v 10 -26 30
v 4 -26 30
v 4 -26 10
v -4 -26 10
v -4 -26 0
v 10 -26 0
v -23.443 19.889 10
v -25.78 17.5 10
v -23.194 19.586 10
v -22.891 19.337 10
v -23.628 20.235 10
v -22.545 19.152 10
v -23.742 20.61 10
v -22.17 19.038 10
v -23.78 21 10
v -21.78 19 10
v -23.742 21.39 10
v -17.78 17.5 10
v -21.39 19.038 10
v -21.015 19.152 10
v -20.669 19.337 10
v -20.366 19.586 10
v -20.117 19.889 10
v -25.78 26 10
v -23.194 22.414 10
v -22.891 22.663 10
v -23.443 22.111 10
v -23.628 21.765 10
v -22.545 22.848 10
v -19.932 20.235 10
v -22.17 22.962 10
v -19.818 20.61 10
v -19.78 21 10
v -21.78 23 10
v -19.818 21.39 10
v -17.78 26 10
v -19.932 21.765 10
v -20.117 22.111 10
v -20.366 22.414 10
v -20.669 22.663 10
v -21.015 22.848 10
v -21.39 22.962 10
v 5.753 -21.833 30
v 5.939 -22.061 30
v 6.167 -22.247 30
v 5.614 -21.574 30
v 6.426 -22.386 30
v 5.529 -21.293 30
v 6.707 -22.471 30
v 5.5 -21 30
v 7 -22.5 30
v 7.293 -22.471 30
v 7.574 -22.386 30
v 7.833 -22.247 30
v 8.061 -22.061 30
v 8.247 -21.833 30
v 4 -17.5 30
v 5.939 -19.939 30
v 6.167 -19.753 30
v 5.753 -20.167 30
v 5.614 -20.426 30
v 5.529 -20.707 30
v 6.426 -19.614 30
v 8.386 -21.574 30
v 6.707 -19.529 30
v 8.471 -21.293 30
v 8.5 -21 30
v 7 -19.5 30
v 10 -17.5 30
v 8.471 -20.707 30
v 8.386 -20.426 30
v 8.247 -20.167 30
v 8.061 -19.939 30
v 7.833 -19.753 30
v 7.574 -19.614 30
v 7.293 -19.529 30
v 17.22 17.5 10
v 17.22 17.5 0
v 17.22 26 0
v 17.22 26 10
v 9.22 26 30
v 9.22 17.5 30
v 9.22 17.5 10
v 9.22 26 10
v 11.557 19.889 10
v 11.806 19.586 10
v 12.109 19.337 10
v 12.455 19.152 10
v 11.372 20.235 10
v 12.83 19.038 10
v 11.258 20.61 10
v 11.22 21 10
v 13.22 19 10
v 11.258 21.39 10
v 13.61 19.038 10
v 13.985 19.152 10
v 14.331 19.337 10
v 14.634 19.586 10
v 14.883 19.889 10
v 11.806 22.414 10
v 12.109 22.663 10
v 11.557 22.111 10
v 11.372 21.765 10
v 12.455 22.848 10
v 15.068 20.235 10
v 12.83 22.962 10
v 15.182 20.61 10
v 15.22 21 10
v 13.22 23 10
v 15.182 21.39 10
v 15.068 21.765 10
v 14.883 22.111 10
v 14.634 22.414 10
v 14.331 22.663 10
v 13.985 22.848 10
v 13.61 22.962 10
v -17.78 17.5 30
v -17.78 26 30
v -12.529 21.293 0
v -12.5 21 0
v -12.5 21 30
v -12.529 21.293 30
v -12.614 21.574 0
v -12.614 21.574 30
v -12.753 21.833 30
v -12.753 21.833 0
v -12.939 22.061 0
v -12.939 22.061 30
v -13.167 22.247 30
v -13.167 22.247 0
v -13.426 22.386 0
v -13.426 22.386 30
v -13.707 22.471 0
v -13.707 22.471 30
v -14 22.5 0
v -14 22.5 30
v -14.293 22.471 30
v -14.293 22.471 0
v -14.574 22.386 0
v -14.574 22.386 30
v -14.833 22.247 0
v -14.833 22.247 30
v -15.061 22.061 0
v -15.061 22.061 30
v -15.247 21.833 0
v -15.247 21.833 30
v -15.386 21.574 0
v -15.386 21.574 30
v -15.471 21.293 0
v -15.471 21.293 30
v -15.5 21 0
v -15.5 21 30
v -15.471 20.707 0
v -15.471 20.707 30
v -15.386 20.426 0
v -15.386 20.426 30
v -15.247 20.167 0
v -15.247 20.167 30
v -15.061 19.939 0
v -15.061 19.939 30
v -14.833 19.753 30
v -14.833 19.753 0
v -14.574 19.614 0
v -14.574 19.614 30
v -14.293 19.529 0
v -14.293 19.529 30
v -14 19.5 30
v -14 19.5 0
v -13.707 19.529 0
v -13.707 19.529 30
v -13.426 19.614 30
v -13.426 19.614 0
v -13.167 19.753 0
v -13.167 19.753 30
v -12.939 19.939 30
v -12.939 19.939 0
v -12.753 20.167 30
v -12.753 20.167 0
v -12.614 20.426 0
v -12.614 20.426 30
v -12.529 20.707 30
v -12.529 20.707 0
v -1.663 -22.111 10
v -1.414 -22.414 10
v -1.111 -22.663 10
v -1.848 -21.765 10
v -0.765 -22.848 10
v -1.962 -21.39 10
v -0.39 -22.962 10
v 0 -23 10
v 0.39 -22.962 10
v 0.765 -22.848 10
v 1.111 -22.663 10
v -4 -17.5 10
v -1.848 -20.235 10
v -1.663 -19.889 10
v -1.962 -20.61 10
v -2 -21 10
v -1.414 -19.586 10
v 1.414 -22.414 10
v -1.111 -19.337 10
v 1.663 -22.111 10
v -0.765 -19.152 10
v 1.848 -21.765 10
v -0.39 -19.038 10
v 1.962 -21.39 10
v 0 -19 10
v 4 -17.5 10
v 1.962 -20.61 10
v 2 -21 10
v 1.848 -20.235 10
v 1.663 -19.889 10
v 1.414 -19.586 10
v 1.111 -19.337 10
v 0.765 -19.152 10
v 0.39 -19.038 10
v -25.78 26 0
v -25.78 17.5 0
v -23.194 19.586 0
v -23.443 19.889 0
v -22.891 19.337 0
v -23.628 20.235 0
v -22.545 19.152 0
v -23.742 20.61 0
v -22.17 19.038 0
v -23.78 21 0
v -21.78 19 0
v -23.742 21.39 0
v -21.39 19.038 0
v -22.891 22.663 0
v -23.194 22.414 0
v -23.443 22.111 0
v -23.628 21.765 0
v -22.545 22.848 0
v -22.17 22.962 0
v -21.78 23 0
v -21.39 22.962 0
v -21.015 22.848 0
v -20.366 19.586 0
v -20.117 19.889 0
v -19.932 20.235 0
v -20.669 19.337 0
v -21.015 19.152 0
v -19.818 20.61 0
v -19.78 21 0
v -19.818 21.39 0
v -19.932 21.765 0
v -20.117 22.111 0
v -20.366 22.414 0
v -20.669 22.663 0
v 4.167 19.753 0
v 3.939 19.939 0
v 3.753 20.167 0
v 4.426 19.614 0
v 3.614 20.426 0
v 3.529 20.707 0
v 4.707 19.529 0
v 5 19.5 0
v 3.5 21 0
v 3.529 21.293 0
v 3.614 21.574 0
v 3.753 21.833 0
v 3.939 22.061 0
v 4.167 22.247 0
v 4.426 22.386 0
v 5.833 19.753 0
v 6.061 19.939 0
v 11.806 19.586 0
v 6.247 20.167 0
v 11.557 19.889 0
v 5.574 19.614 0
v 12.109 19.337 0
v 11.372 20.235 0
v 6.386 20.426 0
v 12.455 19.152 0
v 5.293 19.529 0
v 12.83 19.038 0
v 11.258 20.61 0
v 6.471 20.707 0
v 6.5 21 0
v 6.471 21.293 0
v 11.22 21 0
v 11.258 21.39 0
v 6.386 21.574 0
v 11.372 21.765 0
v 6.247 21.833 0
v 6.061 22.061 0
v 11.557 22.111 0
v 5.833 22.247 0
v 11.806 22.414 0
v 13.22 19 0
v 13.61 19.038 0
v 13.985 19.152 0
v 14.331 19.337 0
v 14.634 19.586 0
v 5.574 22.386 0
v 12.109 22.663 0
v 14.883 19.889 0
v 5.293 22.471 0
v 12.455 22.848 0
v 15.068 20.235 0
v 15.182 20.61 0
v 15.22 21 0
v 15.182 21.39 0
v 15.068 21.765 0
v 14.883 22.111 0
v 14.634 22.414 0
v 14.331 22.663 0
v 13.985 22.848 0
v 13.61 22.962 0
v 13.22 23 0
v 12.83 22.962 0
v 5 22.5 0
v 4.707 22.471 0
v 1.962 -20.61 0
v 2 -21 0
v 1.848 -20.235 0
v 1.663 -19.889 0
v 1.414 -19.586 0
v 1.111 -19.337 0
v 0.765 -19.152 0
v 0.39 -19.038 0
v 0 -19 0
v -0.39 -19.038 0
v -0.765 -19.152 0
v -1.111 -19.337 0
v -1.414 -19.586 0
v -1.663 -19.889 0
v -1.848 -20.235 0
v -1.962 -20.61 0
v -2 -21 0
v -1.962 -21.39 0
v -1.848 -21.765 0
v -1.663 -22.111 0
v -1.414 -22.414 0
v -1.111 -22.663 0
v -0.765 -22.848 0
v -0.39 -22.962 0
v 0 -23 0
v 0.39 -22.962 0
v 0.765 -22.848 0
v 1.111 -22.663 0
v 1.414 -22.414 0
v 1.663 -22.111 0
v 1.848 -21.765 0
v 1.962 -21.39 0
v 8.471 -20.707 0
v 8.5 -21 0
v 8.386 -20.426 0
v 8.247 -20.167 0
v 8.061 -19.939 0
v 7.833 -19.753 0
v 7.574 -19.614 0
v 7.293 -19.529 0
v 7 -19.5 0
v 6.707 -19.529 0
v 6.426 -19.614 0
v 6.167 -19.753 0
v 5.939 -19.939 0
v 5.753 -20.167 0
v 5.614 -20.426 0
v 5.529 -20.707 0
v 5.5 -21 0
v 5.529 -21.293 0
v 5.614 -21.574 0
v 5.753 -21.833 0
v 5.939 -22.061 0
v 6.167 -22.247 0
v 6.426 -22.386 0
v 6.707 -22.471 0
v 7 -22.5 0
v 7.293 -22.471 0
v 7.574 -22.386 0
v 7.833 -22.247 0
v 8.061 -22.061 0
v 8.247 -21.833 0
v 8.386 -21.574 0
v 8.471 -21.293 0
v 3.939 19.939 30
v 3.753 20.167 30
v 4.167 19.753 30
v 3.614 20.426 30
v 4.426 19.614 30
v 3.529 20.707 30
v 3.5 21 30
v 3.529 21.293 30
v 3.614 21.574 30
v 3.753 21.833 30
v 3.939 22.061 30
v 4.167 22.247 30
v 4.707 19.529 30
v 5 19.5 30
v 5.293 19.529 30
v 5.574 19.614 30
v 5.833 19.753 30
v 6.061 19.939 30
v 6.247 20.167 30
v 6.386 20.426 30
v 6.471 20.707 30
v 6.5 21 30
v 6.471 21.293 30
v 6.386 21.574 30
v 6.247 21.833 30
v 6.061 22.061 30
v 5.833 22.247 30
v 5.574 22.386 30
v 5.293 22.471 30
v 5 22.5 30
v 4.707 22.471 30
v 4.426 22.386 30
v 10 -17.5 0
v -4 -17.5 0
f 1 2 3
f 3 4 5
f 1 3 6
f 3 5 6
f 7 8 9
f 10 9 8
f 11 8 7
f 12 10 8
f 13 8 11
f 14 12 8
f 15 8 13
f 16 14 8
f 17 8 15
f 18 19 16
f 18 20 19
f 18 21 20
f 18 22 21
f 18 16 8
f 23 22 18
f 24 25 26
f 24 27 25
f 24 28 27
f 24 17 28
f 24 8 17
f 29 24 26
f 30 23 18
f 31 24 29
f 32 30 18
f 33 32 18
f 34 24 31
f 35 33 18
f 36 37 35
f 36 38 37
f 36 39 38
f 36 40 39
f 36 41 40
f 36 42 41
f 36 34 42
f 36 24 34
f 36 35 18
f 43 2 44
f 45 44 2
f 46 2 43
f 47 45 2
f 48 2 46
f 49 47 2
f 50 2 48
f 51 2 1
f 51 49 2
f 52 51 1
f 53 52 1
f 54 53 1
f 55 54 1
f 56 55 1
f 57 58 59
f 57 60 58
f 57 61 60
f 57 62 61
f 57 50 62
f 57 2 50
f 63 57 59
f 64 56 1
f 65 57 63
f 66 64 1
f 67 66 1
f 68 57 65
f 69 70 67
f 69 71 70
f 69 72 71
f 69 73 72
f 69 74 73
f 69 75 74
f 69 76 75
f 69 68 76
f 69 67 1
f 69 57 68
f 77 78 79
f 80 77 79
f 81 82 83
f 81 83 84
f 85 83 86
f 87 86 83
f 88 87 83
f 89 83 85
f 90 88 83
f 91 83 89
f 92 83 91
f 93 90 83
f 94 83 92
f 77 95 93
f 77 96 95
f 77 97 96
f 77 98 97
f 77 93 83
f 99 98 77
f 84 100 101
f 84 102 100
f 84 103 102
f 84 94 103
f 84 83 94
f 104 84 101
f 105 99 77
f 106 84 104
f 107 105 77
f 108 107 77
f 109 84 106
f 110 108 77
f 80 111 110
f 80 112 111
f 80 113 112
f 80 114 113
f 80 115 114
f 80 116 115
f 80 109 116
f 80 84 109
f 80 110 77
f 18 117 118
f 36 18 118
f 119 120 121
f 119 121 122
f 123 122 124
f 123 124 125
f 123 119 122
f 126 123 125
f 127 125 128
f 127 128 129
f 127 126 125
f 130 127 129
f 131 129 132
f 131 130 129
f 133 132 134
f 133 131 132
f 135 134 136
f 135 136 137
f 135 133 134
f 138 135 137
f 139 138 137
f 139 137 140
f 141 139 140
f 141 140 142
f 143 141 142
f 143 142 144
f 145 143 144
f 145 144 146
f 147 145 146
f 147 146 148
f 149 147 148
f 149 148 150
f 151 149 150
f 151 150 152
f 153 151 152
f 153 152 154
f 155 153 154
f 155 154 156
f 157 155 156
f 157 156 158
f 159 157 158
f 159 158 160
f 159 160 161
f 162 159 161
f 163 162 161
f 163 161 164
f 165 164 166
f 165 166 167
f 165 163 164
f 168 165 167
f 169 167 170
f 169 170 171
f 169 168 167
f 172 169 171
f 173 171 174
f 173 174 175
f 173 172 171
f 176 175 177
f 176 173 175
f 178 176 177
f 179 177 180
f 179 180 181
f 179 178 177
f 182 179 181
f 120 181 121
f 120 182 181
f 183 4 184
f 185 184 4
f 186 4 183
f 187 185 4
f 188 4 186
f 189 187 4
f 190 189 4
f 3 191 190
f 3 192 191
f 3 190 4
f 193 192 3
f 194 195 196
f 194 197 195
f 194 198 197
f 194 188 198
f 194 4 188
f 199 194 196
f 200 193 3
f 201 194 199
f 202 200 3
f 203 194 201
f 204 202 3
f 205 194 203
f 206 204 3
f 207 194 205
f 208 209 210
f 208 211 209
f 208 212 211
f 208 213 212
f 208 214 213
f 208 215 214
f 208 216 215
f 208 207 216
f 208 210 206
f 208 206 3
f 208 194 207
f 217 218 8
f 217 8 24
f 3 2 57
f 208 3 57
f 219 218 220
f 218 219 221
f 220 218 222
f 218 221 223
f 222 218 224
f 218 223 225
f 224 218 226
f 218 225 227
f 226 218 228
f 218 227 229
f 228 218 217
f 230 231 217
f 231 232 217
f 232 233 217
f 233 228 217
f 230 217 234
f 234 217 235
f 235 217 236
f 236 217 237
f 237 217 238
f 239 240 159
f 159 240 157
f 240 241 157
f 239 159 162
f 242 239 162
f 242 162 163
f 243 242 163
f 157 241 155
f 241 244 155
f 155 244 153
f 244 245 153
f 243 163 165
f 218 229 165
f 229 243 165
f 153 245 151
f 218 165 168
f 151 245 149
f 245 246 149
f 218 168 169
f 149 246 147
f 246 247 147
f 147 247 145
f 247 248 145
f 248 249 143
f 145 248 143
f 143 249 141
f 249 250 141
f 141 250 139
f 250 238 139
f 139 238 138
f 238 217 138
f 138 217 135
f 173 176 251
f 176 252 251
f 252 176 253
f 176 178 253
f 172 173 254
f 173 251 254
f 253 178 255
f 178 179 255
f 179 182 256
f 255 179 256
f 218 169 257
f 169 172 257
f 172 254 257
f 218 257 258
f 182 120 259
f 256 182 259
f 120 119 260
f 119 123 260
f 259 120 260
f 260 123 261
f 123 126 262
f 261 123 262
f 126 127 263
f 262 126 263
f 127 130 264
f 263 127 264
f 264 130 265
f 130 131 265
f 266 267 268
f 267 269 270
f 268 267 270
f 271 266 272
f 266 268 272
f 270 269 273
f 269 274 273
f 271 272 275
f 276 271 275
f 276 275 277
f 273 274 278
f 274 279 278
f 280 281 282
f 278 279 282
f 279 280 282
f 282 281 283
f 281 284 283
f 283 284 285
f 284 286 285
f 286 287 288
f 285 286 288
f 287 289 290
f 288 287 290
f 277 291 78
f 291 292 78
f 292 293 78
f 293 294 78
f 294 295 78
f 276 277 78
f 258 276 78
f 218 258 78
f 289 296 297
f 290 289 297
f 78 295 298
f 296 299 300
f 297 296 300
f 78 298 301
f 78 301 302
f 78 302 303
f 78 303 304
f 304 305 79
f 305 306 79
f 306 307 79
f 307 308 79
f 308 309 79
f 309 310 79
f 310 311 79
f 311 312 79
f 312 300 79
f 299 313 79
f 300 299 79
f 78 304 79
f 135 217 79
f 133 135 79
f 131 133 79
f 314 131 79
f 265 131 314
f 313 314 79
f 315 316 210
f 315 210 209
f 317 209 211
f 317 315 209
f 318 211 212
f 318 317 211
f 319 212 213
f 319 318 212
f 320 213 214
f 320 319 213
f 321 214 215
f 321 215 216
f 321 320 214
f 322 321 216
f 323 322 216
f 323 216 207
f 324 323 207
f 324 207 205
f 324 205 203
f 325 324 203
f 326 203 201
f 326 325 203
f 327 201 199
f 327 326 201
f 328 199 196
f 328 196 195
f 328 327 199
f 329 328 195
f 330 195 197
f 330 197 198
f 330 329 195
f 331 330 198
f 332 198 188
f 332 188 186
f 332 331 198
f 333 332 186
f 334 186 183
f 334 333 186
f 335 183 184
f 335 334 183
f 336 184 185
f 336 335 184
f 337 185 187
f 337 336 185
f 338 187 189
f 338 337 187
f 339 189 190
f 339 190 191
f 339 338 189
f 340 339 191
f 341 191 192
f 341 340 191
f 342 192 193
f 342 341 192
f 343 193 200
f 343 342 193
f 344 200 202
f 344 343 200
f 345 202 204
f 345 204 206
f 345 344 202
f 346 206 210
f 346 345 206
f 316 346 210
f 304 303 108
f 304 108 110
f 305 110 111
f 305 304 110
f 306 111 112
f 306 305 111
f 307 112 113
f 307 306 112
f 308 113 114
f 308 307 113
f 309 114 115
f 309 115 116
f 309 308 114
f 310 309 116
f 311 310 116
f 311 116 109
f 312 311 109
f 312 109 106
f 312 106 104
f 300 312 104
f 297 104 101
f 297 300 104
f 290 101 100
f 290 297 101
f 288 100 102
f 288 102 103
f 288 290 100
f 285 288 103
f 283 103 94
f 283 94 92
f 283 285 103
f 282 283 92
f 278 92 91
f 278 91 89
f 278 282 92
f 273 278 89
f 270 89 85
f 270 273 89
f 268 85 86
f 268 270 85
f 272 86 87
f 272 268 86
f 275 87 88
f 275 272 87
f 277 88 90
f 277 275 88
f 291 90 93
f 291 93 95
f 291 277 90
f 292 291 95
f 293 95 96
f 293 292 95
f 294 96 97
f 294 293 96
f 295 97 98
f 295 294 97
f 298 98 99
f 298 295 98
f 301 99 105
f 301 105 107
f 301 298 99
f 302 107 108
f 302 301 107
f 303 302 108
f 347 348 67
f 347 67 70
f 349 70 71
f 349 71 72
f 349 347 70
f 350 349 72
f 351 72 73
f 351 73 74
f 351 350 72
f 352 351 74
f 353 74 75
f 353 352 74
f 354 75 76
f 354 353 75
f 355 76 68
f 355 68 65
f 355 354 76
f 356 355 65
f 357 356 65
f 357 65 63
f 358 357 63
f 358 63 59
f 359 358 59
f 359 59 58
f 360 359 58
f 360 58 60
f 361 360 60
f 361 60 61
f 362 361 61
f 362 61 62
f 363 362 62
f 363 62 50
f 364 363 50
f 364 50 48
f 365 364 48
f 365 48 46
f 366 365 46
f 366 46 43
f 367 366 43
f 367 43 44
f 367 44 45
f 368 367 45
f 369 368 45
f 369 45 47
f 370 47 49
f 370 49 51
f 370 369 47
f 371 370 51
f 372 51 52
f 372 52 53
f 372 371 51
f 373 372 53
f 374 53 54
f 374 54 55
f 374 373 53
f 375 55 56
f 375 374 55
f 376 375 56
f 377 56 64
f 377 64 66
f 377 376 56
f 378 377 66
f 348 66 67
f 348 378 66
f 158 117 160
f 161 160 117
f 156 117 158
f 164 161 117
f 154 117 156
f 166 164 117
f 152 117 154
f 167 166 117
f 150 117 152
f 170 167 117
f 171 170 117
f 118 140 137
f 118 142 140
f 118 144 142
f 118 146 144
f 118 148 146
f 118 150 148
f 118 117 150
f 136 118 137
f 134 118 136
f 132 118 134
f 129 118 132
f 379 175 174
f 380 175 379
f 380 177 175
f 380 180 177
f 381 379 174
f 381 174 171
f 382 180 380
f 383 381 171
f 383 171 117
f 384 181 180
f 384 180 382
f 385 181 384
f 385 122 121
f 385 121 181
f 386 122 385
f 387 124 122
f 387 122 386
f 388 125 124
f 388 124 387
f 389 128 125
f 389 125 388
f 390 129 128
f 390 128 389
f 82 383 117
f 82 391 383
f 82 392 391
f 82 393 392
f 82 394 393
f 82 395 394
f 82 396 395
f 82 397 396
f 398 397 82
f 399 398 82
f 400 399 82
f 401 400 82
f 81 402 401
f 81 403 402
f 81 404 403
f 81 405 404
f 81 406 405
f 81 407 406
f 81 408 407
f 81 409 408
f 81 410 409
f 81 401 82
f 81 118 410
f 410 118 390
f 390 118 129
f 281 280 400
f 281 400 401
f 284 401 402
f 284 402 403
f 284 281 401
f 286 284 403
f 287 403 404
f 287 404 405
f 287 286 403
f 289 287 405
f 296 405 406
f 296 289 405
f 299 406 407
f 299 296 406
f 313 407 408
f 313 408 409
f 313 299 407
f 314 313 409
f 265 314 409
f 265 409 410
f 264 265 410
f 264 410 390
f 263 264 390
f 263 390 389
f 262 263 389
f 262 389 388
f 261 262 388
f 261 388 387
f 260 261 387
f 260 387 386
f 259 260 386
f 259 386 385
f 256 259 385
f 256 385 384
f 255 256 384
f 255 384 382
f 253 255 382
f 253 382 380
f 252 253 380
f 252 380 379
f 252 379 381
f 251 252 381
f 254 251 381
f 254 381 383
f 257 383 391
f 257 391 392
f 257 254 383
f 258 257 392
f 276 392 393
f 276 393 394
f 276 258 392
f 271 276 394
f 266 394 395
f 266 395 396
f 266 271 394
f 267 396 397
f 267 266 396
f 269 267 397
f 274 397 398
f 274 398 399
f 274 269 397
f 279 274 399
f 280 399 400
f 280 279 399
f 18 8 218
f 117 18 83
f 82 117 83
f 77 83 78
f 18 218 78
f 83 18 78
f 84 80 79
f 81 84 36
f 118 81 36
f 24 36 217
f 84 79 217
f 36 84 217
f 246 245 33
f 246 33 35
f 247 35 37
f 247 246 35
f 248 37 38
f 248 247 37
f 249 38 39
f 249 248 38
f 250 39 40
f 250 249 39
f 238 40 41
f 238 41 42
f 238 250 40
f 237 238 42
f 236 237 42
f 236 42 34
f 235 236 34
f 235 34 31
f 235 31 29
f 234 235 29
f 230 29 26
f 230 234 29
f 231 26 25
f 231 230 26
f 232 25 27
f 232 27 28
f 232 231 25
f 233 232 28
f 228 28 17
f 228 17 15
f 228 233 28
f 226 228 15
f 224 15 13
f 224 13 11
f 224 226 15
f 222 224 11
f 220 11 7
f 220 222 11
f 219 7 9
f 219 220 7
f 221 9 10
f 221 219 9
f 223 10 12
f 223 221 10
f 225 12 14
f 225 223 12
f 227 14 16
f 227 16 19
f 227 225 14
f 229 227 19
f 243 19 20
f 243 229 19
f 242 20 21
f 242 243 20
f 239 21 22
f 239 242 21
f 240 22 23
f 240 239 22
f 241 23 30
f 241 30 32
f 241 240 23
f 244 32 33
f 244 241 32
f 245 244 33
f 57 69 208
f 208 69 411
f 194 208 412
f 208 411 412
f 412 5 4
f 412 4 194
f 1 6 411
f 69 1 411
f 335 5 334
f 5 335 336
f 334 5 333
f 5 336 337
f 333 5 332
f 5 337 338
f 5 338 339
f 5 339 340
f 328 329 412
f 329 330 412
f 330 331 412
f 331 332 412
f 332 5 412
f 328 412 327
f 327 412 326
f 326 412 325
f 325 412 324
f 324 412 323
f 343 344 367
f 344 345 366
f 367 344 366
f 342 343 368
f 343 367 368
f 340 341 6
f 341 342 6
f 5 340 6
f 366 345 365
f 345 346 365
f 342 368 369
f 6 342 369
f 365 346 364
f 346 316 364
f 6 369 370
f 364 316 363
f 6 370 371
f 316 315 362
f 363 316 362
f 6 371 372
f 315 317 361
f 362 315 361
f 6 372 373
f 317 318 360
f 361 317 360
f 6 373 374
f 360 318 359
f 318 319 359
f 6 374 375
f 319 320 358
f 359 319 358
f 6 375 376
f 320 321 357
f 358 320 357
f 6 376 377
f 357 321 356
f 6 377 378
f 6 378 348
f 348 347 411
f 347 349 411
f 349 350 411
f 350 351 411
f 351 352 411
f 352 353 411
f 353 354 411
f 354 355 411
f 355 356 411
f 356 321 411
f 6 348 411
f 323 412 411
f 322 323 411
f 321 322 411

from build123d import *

# Parameters (mm, degrees)
F0_W     = 8
F0_H     = 8.5
F0_R     = 2
F0_W_2   = 27
F0_R_2   = 1.5
F1_DEPTH = 10
F2_DEPTH = 30
F0_W_3   = 6
F3_DEPTH = 10
F4_DEPTH = 30


with BuildPart() as f1:
    # F0 (on Top) → F1 (new body)
    with BuildSketch(Plane.XY):
        with Locations((-21.78, 21.75)):
            Rectangle(F0_W, F0_H)
        with Locations((-21.78, 21)):
            Circle(F0_R, mode=Mode.SUBTRACT)
        with Locations((-4.28, 21.75)):
            Rectangle(F0_W_2, F0_H)
        with Locations((-14, 21)):
            Circle(F0_R_2, mode=Mode.SUBTRACT)
        with Locations((5, 21)):
            Circle(F0_R_2, mode=Mode.SUBTRACT)
        with Locations((13.22, 21.75)):
            Rectangle(F0_W, F0_H)
        with Locations((13.22, 21)):
            Circle(F0_R, mode=Mode.SUBTRACT)
    extrude(amount=F1_DEPTH)

    # F0 (on Top) → F2 (join)
    with BuildSketch(Plane.XY):
        with Locations((-4.28, 21.75)):
            Rectangle(F0_W_2, F0_H)
        with Locations((-14, 21)):
            Circle(F0_R_2, mode=Mode.SUBTRACT)
        with Locations((5, 21)):
            Circle(F0_R_2, mode=Mode.SUBTRACT)
    extrude(amount=F2_DEPTH)


with BuildPart() as f3:
    # F0 (on Top) → F3 (new body)
    with BuildSketch(Plane.XY):
        with Locations((0, -21.75)):
            Rectangle(F0_W, F0_H)
        with Locations((0, -21)):
            Circle(F0_R, mode=Mode.SUBTRACT)
        with Locations((7, -21.75)):
            Rectangle(F0_W_3, F0_H)
        with Locations((7, -21)):
            Circle(F0_R_2, mode=Mode.SUBTRACT)
    extrude(amount=F3_DEPTH)

    # F0 (on Top) → F4 (join)
    with BuildSketch(Plane.XY):
        with Locations((7, -21.75)):
            Rectangle(F0_W_3, F0_H)
        with Locations((7, -21)):
            Circle(F0_R_2, mode=Mode.SUBTRACT)
    extrude(amount=F4_DEPTH)


solid = Compound([f1.part, f3.part])
